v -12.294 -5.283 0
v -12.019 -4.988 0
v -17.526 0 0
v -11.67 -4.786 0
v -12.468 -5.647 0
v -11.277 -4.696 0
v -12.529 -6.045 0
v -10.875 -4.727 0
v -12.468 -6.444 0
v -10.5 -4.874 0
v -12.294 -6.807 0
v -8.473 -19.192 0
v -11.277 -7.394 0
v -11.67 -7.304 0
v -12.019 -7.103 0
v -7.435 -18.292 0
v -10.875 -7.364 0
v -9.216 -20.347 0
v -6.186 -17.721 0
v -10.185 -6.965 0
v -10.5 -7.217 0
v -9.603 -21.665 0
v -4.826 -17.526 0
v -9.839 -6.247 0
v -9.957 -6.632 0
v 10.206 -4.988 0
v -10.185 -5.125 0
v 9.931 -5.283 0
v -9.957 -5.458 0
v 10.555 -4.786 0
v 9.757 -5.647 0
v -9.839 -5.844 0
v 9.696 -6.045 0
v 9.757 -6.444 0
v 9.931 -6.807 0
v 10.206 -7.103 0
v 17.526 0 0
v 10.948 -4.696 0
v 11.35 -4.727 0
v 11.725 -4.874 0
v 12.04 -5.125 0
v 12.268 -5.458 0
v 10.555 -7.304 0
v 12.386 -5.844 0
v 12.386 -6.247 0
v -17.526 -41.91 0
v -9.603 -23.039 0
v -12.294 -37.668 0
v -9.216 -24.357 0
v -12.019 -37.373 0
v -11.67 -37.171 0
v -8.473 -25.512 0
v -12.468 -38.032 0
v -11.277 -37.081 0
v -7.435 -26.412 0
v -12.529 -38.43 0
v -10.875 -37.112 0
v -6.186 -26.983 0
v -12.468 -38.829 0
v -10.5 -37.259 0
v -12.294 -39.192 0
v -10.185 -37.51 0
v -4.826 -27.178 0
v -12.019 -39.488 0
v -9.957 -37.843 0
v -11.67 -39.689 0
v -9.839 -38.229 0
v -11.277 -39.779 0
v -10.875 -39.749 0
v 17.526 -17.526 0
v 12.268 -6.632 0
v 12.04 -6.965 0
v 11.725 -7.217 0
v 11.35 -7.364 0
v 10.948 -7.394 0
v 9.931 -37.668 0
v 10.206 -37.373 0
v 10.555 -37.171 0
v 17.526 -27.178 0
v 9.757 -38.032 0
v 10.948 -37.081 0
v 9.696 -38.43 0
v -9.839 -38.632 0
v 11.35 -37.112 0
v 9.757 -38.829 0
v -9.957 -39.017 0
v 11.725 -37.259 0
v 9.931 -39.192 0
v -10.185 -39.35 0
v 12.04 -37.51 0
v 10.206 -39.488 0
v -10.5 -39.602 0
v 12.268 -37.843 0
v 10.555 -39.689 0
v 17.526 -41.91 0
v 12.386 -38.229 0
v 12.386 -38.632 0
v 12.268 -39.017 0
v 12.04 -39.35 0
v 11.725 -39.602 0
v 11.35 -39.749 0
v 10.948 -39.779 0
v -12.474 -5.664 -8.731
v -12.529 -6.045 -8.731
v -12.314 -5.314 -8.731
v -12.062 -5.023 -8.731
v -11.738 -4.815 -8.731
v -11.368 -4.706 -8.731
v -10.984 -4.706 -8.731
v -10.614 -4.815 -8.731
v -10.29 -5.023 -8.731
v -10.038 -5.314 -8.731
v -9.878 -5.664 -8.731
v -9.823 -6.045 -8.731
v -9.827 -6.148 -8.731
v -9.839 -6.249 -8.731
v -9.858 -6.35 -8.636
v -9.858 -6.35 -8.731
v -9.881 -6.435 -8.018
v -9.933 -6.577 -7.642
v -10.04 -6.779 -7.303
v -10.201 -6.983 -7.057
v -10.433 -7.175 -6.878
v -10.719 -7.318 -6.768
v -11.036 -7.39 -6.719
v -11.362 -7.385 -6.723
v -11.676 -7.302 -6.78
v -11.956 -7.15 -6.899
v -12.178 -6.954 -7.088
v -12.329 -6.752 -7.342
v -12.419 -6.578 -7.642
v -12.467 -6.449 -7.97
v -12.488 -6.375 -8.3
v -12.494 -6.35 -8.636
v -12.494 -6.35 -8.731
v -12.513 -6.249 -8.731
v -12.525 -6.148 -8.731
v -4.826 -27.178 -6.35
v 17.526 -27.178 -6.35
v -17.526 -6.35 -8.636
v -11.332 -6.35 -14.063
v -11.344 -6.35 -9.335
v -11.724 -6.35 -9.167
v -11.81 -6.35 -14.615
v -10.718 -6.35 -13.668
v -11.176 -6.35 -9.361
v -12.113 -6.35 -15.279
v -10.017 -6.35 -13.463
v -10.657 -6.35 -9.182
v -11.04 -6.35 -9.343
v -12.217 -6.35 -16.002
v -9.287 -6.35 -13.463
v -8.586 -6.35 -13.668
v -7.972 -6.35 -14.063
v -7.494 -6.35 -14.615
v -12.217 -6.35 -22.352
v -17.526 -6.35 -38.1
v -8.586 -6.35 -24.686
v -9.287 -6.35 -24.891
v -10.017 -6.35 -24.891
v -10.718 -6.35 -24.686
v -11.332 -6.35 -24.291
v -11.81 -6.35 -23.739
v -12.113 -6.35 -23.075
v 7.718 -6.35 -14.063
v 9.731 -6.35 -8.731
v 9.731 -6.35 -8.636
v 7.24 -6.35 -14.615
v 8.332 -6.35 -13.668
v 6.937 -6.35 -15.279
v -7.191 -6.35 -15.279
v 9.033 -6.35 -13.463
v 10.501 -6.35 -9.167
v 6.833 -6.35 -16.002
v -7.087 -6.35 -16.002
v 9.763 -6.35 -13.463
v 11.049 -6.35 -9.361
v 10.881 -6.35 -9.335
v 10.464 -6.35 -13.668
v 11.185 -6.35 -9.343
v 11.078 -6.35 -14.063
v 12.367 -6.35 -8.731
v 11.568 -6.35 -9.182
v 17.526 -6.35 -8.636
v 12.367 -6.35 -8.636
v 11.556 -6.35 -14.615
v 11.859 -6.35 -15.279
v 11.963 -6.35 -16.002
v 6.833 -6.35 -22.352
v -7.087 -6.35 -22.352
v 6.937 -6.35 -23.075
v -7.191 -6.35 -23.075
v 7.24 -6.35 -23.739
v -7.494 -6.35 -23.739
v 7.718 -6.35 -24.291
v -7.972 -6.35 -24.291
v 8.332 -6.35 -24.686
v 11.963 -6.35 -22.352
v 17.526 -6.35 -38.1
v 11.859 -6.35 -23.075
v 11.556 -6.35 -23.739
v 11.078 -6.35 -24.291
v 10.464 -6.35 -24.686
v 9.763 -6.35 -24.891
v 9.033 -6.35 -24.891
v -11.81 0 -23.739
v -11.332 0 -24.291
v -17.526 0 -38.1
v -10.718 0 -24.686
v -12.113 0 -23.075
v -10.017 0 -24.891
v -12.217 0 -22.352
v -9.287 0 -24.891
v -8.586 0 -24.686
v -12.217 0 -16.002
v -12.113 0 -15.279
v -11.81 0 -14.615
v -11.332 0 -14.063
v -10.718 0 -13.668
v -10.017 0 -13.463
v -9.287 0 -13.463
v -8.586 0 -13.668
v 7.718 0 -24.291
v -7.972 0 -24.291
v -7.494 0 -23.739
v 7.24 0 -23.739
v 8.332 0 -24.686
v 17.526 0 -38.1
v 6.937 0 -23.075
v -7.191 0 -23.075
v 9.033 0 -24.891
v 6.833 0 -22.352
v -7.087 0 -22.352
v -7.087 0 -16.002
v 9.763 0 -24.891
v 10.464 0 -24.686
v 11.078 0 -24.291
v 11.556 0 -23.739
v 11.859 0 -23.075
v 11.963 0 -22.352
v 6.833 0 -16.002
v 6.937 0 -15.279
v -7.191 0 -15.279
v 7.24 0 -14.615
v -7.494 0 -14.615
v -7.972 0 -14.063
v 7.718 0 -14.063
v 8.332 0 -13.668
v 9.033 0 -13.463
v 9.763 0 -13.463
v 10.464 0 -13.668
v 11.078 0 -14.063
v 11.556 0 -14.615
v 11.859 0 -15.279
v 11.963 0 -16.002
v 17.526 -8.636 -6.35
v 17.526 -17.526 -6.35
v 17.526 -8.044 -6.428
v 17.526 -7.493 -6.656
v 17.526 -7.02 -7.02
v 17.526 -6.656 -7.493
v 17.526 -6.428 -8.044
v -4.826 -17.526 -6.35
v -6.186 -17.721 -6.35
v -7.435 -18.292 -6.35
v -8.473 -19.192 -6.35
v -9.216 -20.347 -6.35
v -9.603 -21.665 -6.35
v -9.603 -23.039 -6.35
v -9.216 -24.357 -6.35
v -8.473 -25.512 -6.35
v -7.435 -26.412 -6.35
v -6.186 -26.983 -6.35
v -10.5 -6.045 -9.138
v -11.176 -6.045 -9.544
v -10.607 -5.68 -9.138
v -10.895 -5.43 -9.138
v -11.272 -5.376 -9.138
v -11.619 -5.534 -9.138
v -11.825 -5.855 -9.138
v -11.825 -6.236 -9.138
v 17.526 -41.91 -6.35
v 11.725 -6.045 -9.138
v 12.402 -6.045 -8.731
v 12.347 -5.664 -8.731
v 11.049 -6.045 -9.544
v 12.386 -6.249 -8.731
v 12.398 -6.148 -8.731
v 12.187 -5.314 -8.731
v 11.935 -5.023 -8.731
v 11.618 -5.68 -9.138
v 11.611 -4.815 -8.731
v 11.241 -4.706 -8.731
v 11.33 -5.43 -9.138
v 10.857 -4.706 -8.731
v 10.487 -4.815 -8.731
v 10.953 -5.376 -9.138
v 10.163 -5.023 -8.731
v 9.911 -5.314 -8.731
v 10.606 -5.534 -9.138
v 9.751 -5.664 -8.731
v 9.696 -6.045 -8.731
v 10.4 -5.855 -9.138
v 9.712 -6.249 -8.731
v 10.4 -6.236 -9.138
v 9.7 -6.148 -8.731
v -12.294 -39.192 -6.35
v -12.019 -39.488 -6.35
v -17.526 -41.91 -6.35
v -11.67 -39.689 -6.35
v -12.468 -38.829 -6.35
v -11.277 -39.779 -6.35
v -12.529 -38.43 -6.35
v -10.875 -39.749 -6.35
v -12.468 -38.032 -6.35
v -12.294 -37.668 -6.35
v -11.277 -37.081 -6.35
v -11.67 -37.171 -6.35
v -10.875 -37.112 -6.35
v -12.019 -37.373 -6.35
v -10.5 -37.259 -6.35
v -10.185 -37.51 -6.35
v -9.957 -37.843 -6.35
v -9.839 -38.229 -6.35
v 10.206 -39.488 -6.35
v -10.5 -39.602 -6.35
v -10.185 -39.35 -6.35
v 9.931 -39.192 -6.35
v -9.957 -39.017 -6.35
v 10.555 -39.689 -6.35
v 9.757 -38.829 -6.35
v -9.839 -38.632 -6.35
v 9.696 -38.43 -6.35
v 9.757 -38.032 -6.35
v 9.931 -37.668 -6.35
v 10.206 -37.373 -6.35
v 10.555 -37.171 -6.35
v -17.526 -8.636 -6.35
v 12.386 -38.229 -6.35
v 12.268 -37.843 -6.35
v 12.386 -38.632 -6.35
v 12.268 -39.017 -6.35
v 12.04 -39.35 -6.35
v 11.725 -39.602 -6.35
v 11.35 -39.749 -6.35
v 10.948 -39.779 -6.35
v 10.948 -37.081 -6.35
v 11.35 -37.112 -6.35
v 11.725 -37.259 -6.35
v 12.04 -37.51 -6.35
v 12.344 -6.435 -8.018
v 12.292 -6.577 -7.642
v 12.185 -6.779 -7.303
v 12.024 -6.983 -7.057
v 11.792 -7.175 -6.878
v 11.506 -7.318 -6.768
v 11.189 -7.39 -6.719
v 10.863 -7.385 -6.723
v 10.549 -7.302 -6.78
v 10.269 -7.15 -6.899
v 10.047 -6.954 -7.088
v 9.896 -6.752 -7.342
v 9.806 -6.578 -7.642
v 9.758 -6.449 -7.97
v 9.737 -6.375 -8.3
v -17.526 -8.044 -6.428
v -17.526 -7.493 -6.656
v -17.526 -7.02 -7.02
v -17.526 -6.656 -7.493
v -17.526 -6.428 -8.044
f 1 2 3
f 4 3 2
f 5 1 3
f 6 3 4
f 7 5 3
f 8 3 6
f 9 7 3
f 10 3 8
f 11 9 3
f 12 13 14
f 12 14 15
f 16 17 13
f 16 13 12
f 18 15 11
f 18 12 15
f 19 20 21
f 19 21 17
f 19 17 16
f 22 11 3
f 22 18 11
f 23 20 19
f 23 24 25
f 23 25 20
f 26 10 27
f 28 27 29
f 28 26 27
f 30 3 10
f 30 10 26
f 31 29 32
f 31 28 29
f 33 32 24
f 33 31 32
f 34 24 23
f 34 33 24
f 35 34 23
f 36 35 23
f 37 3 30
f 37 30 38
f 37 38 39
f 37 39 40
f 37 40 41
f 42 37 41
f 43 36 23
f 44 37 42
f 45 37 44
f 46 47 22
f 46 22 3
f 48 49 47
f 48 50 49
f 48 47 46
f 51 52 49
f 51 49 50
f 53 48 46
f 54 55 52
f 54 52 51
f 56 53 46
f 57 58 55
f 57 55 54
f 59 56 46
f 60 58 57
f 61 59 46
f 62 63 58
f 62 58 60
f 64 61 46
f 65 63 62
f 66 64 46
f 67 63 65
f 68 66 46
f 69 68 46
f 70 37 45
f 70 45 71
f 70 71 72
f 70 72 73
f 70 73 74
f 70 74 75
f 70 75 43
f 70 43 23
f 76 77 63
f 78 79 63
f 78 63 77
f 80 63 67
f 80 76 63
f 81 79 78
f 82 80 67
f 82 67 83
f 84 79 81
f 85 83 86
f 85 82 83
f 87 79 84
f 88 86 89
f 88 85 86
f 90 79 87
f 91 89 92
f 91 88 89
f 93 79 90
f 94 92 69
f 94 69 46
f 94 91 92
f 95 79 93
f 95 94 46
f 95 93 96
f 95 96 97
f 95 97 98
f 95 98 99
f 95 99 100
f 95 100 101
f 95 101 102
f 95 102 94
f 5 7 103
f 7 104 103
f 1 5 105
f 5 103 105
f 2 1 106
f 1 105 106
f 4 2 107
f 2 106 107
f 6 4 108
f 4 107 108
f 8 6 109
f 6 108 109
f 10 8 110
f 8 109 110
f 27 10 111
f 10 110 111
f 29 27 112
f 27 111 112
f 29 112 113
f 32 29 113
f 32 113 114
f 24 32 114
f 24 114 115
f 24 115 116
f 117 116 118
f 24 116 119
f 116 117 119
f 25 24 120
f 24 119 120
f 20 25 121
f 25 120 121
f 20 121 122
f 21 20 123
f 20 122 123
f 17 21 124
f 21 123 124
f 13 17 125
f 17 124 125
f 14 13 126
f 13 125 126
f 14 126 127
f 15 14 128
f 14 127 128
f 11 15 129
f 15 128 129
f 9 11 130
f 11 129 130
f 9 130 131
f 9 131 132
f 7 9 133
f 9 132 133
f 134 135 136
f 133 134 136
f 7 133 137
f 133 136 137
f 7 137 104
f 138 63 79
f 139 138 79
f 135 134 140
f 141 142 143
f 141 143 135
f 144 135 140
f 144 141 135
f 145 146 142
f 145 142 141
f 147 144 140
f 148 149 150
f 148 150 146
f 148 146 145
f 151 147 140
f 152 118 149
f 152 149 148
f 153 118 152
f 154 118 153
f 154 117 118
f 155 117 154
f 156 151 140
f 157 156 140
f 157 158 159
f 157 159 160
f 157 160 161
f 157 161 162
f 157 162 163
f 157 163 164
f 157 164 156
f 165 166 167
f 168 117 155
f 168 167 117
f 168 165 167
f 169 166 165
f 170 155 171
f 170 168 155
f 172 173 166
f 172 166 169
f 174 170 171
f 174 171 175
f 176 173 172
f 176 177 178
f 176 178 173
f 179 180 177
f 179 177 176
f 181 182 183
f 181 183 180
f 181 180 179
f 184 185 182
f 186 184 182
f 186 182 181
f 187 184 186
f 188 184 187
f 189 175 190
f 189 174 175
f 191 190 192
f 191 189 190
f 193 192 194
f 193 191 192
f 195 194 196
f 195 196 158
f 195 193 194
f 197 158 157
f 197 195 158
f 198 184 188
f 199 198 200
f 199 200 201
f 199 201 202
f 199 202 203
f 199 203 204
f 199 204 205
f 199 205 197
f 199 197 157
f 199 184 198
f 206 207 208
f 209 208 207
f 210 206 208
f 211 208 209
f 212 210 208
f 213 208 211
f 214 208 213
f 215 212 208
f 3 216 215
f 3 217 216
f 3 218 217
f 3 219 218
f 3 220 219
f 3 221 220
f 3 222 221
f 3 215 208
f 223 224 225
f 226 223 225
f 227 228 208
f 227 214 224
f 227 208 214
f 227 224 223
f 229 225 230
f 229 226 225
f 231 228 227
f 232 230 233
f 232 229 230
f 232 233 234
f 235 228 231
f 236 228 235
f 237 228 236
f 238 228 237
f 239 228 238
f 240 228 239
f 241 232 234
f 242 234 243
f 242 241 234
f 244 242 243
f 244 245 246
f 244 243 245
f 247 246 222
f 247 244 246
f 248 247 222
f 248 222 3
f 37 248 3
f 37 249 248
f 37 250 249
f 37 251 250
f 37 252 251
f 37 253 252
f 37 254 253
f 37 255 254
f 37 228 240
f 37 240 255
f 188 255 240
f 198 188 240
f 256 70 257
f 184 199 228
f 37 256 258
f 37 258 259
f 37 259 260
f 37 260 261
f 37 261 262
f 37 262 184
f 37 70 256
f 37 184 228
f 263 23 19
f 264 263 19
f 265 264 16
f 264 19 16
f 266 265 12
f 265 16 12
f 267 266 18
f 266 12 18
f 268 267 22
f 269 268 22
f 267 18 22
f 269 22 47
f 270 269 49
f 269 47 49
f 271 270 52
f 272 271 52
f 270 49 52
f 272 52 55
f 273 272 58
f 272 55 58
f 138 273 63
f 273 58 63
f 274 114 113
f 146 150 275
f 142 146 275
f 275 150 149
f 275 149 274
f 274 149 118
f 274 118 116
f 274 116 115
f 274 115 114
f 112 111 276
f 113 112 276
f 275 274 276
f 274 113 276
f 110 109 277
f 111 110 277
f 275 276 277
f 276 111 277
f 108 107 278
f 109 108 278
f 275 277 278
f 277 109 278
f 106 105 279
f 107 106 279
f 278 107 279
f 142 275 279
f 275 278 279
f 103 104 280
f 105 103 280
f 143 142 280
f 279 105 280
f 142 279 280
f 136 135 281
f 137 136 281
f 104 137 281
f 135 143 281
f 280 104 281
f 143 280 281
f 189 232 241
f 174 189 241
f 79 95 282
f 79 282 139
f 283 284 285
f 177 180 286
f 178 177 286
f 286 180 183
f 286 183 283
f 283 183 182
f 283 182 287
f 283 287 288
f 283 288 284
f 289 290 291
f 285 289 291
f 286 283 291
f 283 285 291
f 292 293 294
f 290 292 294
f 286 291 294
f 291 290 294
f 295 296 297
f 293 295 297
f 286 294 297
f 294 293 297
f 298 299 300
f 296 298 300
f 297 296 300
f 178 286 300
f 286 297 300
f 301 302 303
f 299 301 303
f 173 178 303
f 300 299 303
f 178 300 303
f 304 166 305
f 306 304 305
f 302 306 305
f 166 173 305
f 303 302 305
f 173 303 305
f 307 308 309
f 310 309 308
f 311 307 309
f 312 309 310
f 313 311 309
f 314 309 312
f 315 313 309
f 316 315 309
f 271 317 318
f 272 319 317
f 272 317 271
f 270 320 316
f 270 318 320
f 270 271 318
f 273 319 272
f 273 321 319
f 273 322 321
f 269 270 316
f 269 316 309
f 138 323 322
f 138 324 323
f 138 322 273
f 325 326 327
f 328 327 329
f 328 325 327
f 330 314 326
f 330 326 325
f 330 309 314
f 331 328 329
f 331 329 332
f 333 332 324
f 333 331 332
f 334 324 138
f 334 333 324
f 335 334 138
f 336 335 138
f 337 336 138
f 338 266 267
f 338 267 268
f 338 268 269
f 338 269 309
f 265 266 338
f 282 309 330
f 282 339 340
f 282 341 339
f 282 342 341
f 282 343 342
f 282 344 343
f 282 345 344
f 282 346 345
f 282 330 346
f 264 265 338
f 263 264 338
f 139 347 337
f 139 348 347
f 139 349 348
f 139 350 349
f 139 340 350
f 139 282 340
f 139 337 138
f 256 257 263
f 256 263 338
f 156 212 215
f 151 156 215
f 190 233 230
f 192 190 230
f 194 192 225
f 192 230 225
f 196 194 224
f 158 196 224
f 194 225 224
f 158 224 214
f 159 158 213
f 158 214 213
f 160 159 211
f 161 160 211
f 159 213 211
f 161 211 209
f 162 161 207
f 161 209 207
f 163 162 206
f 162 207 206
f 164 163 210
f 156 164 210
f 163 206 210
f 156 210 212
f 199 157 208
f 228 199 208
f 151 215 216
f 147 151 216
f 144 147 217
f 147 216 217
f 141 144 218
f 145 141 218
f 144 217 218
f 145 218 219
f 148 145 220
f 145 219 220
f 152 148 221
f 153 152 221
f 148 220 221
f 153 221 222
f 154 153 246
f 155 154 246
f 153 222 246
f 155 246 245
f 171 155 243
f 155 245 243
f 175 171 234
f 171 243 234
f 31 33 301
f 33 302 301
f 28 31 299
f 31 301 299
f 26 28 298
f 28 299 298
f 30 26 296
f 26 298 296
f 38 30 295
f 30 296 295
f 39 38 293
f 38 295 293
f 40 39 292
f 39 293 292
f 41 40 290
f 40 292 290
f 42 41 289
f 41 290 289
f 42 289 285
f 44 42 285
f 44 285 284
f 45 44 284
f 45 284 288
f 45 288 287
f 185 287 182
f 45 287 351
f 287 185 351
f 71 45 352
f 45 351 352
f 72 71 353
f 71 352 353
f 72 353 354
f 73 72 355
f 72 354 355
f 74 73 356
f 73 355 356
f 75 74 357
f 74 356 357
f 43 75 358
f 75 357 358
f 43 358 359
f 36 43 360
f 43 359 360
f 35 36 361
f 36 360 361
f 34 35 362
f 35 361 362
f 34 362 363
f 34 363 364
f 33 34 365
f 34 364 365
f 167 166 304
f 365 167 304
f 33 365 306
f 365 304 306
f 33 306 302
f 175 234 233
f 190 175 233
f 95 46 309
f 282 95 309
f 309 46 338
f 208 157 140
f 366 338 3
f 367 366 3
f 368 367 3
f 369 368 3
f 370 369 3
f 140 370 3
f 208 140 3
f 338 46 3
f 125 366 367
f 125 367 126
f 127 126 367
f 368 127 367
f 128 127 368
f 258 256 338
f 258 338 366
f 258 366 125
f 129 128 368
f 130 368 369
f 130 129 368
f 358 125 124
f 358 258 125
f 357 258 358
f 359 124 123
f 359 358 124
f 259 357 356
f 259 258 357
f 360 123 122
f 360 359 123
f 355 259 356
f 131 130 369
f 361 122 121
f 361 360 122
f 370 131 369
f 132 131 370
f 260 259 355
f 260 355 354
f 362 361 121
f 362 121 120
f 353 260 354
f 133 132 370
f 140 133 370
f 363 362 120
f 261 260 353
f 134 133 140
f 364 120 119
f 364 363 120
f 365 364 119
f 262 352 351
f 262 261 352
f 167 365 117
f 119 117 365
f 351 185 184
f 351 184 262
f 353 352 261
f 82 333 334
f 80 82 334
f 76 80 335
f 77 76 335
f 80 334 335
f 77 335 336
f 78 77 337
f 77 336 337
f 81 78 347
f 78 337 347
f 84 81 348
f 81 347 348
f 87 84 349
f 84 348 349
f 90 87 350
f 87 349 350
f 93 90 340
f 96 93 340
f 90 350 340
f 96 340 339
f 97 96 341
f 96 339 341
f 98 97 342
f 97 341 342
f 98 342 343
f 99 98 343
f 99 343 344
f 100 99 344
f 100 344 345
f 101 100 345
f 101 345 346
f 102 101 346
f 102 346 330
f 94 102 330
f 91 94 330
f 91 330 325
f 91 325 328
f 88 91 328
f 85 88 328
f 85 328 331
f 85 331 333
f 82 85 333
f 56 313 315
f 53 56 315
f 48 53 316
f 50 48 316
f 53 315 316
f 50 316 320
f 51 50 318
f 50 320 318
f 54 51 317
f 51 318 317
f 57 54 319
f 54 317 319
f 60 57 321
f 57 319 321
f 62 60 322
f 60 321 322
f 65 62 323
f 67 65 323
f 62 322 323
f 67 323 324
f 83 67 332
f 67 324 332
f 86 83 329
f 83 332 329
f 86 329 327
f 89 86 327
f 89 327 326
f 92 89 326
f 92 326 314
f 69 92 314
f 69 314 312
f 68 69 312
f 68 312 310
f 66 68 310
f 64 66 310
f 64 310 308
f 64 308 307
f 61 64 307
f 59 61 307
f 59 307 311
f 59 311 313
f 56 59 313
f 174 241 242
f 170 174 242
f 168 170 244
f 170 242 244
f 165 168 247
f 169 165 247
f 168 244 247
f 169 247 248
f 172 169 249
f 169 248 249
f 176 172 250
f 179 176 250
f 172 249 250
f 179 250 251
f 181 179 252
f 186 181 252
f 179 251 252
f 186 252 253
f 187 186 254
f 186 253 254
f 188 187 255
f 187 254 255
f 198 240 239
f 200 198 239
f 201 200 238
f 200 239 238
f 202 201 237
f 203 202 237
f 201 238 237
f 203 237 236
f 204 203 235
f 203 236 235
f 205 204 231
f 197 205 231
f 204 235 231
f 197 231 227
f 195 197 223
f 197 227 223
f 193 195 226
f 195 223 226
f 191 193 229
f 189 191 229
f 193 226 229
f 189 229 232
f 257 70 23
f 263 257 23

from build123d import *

# Parameters (mm, degrees)
F1_DEPTH = 17.526
F3_DEPTH = 6.35
F5_D     = 2.7051
F5_DEPTH = 8.73125
F5_TIP   = 0.8126940303
F7_DEPTH = 6.35


with BuildPart() as f1:
    # F0 (on Right) → F1 (new body, symmetric)
    with BuildSketch(Plane.YZ):
        with BuildLine():
            Line((0, 0), (-41.91, 0))
            Line((-41.91, 0), (-41.91, -6.35))
            Line((-41.91, -6.35), (-8.636, -6.35))
            ThreePointArc((-8.636, -6.35), (-7.0195538982, -7.0195538982), (-6.35, -8.636))
            Line((-6.35, -8.636), (-6.35, -38.1))
            Line((-6.35, -38.1), (0, -38.1))
            Line((0, -38.1), (0, 0))
        make_face()
    extrude(amount=F1_DEPTH, both=True)

    # F2 (on face) → F3 (cut, through all)
    with BuildSketch(Plane.XY):
        with BuildLine():
            Line((17.526, -27.178), (17.526, -17.526))
            Line((17.526, -17.526), (-4.826, -17.526))
            ThreePointArc((-4.826, -17.526), (-9.652, -22.352), (-4.826, -27.178))
            Line((-4.826, -27.178), (17.526, -27.178))
        make_face()
    extrude(amount=-F3_DEPTH, mode=Mode.SUBTRACT)

    # F5
    with Locations(Plane.XY):
        with Locations((-11.176, -6.0452), (11.049, -6.0452), (-11.176, -38.4302), (11.049, -38.4302)):
            Hole(F5_D / 2, depth=F5_DEPTH)
            with Locations((0, 0, -(F5_DEPTH + F5_TIP / 2))):  # 118° drill point
                Cone(0, F5_D / 2, F5_TIP, mode=Mode.SUBTRACT)

    # F6 (on face) → F7 (cut, through all)
    with BuildSketch(Plane(origin=(0, 0, 0), x_dir=(-1, 0, 0), z_dir=(0, 1, 0))):
        with BuildLine():
            Line((12.2174, -22.352), (12.2174, -16.002))
            ThreePointArc((12.2174, -16.002), (9.652, -13.4366), (7.0866, -16.002))
            Line((7.0866, -16.002), (7.0866, -22.352))
            ThreePointArc((7.0866, -22.352), (9.652, -24.9174), (12.2174, -22.352))
        make_face()
        with BuildLine():
            Line((-6.8326, -22.352), (-6.8326, -16.002))
            ThreePointArc((-6.8326, -16.002), (-9.398, -13.4366), (-11.9634, -16.002))
            Line((-11.9634, -16.002), (-11.9634, -22.352))
            ThreePointArc((-11.9634, -22.352), (-9.398, -24.9174), (-6.8326, -22.352))
        make_face()
    extrude(amount=-F7_DEPTH, mode=Mode.SUBTRACT)


solid = f1.part
